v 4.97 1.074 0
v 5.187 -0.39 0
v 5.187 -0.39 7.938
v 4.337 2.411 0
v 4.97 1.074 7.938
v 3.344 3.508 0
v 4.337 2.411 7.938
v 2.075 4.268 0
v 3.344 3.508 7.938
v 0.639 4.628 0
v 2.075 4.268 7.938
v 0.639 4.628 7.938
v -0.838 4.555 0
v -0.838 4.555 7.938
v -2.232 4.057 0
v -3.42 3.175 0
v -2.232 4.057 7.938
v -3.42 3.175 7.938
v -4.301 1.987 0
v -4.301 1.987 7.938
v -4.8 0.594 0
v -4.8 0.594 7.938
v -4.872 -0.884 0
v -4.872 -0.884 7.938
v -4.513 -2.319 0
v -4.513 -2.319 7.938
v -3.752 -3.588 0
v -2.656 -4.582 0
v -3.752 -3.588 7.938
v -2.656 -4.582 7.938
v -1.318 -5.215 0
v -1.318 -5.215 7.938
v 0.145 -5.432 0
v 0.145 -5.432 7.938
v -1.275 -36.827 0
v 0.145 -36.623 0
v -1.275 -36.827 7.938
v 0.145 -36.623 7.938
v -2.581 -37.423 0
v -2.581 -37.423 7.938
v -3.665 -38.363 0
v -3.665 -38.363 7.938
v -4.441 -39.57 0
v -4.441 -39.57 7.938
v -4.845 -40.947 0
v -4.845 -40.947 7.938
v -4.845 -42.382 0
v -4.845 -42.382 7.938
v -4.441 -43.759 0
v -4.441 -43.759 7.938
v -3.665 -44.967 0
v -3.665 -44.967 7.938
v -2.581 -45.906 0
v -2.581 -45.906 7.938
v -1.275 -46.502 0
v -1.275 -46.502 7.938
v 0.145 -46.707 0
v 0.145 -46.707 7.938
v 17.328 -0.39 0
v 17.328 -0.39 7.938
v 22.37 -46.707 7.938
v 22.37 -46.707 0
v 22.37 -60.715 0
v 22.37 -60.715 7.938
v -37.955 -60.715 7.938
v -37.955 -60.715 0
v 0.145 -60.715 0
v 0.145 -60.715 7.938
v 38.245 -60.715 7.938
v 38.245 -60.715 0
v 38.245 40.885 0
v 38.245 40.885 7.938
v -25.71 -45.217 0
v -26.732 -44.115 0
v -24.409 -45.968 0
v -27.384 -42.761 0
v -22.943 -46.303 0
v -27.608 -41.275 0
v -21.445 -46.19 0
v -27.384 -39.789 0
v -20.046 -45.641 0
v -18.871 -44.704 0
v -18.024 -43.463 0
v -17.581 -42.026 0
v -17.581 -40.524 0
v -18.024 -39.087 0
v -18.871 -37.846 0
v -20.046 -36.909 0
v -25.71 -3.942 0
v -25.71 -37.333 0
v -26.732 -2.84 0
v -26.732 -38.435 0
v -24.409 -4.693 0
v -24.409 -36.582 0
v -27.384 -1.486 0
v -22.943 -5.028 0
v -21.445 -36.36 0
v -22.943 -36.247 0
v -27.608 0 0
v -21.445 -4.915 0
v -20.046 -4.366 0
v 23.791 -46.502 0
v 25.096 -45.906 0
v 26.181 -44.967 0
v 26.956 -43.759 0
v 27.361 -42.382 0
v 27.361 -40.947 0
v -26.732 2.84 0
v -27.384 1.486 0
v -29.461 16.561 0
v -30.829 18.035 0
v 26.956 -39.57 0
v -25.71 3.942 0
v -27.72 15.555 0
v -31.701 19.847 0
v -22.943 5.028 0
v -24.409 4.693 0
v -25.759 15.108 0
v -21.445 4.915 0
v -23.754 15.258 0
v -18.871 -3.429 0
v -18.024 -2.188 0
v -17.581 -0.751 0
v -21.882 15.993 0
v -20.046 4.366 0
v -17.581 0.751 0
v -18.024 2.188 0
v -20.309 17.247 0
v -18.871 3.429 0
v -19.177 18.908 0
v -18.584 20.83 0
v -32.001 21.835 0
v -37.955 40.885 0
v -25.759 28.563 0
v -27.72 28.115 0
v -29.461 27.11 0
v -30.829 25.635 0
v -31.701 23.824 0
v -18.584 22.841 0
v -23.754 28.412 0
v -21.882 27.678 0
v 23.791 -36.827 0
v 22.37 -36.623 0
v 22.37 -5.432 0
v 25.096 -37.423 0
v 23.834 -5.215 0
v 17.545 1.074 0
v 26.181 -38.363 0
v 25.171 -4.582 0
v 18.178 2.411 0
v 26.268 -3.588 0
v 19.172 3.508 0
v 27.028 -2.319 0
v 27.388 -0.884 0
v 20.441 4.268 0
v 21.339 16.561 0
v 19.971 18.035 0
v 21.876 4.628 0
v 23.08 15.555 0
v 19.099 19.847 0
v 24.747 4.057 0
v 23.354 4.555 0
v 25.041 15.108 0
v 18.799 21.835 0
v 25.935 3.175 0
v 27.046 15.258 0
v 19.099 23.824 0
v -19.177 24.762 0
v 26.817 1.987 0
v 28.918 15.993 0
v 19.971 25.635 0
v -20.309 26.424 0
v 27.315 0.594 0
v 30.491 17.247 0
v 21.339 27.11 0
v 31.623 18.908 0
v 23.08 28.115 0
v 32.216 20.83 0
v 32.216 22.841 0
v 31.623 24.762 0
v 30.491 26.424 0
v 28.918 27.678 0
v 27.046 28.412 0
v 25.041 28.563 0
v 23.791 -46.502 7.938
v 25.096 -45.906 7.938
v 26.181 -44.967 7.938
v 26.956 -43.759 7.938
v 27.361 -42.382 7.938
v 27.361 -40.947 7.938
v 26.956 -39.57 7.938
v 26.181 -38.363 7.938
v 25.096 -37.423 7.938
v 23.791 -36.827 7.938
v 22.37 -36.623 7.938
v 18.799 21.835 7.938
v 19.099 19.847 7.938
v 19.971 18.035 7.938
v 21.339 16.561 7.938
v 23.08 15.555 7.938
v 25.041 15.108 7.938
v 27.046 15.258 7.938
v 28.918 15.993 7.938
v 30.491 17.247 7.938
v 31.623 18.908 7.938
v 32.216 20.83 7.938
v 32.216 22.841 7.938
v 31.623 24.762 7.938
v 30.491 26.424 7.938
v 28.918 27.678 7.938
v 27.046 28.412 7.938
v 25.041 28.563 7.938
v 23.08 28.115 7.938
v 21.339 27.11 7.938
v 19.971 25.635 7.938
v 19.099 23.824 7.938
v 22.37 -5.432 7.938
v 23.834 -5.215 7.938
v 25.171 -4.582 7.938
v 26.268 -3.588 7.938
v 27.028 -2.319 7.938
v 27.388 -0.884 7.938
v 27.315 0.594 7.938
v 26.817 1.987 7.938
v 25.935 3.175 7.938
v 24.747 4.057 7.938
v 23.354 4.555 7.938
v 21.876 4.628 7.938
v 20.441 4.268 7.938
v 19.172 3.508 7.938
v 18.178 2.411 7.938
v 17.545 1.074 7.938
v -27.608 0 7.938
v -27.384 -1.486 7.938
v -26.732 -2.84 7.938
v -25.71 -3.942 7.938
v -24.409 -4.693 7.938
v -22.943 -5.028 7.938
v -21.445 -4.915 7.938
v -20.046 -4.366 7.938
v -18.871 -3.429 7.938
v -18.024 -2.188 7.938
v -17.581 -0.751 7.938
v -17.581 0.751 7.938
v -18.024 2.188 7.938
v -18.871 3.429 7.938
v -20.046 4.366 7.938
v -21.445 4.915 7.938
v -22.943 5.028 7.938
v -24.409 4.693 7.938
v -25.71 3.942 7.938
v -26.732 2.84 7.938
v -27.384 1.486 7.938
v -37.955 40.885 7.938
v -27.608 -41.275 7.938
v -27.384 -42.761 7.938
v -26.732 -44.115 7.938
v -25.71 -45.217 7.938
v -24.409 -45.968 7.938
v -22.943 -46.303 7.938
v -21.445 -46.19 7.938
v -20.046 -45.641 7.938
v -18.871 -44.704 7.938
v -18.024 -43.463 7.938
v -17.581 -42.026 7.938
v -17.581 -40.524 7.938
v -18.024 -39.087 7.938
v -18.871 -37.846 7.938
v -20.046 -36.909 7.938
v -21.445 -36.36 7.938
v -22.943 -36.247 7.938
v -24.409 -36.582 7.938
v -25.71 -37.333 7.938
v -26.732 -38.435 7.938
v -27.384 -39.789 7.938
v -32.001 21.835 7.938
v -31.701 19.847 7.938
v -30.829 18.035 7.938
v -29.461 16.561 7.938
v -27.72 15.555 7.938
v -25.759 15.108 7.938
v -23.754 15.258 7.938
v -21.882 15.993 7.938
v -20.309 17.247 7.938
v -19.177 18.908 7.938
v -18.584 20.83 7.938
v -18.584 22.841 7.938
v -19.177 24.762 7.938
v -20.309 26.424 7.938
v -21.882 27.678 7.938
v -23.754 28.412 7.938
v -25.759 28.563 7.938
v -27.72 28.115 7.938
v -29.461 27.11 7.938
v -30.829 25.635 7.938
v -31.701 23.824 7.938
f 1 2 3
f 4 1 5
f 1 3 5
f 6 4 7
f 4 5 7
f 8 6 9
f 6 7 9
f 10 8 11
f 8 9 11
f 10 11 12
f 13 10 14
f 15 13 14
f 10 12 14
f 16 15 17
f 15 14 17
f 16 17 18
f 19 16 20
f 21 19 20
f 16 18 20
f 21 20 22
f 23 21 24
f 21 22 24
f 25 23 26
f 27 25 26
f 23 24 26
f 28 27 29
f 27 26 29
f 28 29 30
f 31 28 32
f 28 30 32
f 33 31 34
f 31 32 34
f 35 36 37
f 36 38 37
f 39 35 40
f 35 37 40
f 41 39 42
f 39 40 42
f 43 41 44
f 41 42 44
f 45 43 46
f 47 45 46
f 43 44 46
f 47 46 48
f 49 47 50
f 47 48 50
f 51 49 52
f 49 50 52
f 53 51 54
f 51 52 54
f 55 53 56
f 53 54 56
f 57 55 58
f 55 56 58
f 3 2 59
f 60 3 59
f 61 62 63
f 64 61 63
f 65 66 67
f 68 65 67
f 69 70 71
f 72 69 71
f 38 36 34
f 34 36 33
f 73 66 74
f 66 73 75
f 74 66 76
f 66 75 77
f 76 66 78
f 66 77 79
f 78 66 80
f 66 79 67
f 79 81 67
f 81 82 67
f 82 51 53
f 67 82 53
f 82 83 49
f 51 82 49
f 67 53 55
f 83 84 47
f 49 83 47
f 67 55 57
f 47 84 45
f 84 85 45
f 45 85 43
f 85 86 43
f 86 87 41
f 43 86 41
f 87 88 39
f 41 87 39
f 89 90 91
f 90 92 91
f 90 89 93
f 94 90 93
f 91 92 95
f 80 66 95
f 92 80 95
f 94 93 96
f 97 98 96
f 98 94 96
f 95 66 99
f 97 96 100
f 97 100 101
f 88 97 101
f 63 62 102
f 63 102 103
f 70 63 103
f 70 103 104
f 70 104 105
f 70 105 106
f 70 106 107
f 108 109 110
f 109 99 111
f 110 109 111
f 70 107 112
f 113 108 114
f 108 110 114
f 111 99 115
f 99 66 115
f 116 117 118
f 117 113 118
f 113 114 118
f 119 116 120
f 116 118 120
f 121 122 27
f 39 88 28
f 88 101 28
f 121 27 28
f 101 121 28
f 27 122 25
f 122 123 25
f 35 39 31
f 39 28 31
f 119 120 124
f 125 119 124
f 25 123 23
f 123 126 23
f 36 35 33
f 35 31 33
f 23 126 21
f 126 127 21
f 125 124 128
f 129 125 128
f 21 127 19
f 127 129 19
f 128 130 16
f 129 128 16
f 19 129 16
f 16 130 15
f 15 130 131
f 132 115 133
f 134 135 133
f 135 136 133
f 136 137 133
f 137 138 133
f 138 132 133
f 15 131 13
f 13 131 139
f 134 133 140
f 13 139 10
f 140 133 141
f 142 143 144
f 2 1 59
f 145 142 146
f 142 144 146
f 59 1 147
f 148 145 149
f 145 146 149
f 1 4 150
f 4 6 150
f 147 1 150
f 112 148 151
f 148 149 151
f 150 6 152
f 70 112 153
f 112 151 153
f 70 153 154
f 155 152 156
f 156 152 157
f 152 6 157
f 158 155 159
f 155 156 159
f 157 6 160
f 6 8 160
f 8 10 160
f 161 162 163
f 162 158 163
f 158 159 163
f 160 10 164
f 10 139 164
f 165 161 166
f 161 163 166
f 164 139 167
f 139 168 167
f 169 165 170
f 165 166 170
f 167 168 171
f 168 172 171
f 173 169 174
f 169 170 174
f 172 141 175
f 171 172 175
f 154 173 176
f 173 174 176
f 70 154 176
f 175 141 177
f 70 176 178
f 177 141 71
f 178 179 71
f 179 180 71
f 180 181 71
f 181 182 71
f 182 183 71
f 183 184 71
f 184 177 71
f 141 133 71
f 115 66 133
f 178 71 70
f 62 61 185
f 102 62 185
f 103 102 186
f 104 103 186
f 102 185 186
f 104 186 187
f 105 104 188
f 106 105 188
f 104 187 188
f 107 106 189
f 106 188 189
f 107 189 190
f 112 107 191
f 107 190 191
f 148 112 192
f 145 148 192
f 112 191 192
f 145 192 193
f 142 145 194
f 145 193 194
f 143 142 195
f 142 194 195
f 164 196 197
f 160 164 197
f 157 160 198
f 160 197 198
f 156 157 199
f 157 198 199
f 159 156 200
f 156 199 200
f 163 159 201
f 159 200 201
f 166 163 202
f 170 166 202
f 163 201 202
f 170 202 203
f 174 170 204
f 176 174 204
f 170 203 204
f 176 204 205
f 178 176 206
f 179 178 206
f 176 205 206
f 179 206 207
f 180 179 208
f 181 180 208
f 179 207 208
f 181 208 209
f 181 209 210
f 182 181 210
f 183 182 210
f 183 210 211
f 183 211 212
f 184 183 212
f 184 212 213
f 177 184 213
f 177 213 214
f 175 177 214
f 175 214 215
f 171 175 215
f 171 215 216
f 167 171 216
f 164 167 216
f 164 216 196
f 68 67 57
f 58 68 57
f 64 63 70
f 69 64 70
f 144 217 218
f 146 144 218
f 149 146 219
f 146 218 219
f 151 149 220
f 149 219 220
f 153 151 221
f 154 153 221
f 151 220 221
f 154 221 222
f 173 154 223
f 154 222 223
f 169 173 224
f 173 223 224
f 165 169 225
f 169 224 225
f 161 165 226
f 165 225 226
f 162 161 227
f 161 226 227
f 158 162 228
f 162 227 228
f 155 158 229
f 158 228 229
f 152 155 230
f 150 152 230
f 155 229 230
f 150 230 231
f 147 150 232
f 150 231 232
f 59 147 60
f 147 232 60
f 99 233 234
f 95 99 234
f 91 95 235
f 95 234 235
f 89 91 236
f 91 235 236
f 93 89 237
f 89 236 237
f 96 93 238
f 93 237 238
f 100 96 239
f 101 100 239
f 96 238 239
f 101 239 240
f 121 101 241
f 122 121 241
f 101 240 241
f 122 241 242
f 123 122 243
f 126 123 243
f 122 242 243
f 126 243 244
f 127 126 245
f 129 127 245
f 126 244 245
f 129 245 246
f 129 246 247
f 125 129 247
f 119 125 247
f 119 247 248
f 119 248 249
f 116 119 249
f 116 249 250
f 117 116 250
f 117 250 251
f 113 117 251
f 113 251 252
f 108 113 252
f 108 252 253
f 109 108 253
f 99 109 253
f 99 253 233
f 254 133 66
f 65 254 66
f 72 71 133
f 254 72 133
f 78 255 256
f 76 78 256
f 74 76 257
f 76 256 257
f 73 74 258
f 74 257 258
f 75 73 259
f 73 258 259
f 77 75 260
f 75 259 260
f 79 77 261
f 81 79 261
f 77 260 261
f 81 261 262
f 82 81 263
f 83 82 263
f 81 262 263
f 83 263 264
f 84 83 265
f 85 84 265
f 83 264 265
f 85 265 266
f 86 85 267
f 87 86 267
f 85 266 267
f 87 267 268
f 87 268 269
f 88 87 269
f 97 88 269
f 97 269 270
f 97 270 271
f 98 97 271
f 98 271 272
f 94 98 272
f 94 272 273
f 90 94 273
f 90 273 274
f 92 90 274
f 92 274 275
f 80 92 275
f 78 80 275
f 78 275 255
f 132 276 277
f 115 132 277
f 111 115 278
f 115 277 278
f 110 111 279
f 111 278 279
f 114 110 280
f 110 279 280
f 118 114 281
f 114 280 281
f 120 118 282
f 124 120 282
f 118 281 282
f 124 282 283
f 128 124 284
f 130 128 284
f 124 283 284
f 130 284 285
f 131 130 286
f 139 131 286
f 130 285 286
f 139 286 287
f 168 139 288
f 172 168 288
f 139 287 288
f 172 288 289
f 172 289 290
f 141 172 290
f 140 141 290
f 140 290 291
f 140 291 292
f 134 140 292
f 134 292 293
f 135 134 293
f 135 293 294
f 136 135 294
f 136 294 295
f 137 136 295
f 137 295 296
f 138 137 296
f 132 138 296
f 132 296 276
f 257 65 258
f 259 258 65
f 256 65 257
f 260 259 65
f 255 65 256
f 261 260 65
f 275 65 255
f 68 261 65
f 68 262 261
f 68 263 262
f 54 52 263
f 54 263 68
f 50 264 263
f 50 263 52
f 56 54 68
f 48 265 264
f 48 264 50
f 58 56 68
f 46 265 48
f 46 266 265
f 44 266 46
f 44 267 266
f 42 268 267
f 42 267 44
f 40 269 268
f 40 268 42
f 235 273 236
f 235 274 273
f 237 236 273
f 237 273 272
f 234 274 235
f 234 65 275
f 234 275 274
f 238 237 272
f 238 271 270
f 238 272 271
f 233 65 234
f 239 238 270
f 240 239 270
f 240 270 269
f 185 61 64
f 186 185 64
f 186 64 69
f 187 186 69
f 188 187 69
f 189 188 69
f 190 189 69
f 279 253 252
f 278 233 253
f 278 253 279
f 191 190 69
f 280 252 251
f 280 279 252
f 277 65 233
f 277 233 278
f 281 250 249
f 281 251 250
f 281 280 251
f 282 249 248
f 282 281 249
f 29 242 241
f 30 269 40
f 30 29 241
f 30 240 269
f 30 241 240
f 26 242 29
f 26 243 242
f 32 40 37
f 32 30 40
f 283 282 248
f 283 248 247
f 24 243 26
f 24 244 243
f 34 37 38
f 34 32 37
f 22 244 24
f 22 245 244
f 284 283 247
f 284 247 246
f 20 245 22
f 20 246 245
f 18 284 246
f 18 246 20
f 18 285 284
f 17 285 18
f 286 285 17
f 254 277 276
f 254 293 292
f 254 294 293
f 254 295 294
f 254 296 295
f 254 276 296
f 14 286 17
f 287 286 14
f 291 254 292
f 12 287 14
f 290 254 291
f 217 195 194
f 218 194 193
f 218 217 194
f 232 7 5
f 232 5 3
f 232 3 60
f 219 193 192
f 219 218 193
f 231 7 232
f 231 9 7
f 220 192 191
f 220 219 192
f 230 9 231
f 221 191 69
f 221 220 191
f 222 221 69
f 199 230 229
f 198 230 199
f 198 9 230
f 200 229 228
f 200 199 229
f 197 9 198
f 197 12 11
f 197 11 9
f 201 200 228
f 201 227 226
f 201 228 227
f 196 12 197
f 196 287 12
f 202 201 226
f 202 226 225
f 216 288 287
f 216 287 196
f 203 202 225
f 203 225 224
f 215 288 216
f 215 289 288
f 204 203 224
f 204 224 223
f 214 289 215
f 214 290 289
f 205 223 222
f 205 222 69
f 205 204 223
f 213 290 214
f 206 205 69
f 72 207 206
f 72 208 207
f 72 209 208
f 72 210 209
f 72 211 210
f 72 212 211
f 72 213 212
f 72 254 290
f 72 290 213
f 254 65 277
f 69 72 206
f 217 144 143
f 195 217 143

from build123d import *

# Parameters (mm, degrees)
F0_W     = 12.7
F0_H     = 19.05
F1_DEPTH = 7.9375
F2_D     = 10.0838
F3_D     = 13.49248


# Not quite as in the source:
# - a feature names something its author has since deleted; it is built from what else it names


with BuildPart() as f1:
    # F0 (on Top) → F1 (new body)
    with BuildSketch(Plane.XY):
        Polygon((25.5451762405, 40.8851695299), (-25.2548237595, 40.8851695299), (-25.2548237595, 21.8351695299), (-37.9548237595, 21.8351695299), (-37.9548237595, -60.7148304701), (0.1451762405, -60.7148304701), (0.1451762405, -41.6648304701), (0.1451762405, -0.3898304701), (22.3701762405, -0.3898304701), (22.3701762405, -41.6648304701), (22.3701762405, -60.7148304701), (38.2451762405, -60.7148304701), (38.2451762405, 21.8351695299), (25.5451762405, 21.8351695299), align=None)
        with Locations((-31.6048237595, 31.3601695299)):
            Rectangle(F0_W, F0_H)
        with Locations((31.8951762405, 31.3601695299)):
            Rectangle(F0_W, F0_H)
    extrude(amount=F1_DEPTH)

    # F2 (through all)
    with Locations(Plane(origin=(0, 0, 0), x_dir=(1, 0, 0), z_dir=(0, 0, -1))):
        with Locations((0.1451762405, 0.3898304701), (0.1451762405, 41.6648304701), (-22.5665104002, 0), (-22.5665104002, 41.275), (22.3701762405, 41.6648304701), (22.3701762405, 0.3898304701)):
            Hole(F2_D / 2)

    # F3 (through all)
    with Locations(Plane(origin=(0, 0, 0), x_dir=(1, 0, 0), z_dir=(0, 0, -1))):
        with Locations((-25.2548237595, -21.8351695299), (25.5451762405, -21.8351695299)):
            Hole(F3_D / 2)


solid = f1.part
